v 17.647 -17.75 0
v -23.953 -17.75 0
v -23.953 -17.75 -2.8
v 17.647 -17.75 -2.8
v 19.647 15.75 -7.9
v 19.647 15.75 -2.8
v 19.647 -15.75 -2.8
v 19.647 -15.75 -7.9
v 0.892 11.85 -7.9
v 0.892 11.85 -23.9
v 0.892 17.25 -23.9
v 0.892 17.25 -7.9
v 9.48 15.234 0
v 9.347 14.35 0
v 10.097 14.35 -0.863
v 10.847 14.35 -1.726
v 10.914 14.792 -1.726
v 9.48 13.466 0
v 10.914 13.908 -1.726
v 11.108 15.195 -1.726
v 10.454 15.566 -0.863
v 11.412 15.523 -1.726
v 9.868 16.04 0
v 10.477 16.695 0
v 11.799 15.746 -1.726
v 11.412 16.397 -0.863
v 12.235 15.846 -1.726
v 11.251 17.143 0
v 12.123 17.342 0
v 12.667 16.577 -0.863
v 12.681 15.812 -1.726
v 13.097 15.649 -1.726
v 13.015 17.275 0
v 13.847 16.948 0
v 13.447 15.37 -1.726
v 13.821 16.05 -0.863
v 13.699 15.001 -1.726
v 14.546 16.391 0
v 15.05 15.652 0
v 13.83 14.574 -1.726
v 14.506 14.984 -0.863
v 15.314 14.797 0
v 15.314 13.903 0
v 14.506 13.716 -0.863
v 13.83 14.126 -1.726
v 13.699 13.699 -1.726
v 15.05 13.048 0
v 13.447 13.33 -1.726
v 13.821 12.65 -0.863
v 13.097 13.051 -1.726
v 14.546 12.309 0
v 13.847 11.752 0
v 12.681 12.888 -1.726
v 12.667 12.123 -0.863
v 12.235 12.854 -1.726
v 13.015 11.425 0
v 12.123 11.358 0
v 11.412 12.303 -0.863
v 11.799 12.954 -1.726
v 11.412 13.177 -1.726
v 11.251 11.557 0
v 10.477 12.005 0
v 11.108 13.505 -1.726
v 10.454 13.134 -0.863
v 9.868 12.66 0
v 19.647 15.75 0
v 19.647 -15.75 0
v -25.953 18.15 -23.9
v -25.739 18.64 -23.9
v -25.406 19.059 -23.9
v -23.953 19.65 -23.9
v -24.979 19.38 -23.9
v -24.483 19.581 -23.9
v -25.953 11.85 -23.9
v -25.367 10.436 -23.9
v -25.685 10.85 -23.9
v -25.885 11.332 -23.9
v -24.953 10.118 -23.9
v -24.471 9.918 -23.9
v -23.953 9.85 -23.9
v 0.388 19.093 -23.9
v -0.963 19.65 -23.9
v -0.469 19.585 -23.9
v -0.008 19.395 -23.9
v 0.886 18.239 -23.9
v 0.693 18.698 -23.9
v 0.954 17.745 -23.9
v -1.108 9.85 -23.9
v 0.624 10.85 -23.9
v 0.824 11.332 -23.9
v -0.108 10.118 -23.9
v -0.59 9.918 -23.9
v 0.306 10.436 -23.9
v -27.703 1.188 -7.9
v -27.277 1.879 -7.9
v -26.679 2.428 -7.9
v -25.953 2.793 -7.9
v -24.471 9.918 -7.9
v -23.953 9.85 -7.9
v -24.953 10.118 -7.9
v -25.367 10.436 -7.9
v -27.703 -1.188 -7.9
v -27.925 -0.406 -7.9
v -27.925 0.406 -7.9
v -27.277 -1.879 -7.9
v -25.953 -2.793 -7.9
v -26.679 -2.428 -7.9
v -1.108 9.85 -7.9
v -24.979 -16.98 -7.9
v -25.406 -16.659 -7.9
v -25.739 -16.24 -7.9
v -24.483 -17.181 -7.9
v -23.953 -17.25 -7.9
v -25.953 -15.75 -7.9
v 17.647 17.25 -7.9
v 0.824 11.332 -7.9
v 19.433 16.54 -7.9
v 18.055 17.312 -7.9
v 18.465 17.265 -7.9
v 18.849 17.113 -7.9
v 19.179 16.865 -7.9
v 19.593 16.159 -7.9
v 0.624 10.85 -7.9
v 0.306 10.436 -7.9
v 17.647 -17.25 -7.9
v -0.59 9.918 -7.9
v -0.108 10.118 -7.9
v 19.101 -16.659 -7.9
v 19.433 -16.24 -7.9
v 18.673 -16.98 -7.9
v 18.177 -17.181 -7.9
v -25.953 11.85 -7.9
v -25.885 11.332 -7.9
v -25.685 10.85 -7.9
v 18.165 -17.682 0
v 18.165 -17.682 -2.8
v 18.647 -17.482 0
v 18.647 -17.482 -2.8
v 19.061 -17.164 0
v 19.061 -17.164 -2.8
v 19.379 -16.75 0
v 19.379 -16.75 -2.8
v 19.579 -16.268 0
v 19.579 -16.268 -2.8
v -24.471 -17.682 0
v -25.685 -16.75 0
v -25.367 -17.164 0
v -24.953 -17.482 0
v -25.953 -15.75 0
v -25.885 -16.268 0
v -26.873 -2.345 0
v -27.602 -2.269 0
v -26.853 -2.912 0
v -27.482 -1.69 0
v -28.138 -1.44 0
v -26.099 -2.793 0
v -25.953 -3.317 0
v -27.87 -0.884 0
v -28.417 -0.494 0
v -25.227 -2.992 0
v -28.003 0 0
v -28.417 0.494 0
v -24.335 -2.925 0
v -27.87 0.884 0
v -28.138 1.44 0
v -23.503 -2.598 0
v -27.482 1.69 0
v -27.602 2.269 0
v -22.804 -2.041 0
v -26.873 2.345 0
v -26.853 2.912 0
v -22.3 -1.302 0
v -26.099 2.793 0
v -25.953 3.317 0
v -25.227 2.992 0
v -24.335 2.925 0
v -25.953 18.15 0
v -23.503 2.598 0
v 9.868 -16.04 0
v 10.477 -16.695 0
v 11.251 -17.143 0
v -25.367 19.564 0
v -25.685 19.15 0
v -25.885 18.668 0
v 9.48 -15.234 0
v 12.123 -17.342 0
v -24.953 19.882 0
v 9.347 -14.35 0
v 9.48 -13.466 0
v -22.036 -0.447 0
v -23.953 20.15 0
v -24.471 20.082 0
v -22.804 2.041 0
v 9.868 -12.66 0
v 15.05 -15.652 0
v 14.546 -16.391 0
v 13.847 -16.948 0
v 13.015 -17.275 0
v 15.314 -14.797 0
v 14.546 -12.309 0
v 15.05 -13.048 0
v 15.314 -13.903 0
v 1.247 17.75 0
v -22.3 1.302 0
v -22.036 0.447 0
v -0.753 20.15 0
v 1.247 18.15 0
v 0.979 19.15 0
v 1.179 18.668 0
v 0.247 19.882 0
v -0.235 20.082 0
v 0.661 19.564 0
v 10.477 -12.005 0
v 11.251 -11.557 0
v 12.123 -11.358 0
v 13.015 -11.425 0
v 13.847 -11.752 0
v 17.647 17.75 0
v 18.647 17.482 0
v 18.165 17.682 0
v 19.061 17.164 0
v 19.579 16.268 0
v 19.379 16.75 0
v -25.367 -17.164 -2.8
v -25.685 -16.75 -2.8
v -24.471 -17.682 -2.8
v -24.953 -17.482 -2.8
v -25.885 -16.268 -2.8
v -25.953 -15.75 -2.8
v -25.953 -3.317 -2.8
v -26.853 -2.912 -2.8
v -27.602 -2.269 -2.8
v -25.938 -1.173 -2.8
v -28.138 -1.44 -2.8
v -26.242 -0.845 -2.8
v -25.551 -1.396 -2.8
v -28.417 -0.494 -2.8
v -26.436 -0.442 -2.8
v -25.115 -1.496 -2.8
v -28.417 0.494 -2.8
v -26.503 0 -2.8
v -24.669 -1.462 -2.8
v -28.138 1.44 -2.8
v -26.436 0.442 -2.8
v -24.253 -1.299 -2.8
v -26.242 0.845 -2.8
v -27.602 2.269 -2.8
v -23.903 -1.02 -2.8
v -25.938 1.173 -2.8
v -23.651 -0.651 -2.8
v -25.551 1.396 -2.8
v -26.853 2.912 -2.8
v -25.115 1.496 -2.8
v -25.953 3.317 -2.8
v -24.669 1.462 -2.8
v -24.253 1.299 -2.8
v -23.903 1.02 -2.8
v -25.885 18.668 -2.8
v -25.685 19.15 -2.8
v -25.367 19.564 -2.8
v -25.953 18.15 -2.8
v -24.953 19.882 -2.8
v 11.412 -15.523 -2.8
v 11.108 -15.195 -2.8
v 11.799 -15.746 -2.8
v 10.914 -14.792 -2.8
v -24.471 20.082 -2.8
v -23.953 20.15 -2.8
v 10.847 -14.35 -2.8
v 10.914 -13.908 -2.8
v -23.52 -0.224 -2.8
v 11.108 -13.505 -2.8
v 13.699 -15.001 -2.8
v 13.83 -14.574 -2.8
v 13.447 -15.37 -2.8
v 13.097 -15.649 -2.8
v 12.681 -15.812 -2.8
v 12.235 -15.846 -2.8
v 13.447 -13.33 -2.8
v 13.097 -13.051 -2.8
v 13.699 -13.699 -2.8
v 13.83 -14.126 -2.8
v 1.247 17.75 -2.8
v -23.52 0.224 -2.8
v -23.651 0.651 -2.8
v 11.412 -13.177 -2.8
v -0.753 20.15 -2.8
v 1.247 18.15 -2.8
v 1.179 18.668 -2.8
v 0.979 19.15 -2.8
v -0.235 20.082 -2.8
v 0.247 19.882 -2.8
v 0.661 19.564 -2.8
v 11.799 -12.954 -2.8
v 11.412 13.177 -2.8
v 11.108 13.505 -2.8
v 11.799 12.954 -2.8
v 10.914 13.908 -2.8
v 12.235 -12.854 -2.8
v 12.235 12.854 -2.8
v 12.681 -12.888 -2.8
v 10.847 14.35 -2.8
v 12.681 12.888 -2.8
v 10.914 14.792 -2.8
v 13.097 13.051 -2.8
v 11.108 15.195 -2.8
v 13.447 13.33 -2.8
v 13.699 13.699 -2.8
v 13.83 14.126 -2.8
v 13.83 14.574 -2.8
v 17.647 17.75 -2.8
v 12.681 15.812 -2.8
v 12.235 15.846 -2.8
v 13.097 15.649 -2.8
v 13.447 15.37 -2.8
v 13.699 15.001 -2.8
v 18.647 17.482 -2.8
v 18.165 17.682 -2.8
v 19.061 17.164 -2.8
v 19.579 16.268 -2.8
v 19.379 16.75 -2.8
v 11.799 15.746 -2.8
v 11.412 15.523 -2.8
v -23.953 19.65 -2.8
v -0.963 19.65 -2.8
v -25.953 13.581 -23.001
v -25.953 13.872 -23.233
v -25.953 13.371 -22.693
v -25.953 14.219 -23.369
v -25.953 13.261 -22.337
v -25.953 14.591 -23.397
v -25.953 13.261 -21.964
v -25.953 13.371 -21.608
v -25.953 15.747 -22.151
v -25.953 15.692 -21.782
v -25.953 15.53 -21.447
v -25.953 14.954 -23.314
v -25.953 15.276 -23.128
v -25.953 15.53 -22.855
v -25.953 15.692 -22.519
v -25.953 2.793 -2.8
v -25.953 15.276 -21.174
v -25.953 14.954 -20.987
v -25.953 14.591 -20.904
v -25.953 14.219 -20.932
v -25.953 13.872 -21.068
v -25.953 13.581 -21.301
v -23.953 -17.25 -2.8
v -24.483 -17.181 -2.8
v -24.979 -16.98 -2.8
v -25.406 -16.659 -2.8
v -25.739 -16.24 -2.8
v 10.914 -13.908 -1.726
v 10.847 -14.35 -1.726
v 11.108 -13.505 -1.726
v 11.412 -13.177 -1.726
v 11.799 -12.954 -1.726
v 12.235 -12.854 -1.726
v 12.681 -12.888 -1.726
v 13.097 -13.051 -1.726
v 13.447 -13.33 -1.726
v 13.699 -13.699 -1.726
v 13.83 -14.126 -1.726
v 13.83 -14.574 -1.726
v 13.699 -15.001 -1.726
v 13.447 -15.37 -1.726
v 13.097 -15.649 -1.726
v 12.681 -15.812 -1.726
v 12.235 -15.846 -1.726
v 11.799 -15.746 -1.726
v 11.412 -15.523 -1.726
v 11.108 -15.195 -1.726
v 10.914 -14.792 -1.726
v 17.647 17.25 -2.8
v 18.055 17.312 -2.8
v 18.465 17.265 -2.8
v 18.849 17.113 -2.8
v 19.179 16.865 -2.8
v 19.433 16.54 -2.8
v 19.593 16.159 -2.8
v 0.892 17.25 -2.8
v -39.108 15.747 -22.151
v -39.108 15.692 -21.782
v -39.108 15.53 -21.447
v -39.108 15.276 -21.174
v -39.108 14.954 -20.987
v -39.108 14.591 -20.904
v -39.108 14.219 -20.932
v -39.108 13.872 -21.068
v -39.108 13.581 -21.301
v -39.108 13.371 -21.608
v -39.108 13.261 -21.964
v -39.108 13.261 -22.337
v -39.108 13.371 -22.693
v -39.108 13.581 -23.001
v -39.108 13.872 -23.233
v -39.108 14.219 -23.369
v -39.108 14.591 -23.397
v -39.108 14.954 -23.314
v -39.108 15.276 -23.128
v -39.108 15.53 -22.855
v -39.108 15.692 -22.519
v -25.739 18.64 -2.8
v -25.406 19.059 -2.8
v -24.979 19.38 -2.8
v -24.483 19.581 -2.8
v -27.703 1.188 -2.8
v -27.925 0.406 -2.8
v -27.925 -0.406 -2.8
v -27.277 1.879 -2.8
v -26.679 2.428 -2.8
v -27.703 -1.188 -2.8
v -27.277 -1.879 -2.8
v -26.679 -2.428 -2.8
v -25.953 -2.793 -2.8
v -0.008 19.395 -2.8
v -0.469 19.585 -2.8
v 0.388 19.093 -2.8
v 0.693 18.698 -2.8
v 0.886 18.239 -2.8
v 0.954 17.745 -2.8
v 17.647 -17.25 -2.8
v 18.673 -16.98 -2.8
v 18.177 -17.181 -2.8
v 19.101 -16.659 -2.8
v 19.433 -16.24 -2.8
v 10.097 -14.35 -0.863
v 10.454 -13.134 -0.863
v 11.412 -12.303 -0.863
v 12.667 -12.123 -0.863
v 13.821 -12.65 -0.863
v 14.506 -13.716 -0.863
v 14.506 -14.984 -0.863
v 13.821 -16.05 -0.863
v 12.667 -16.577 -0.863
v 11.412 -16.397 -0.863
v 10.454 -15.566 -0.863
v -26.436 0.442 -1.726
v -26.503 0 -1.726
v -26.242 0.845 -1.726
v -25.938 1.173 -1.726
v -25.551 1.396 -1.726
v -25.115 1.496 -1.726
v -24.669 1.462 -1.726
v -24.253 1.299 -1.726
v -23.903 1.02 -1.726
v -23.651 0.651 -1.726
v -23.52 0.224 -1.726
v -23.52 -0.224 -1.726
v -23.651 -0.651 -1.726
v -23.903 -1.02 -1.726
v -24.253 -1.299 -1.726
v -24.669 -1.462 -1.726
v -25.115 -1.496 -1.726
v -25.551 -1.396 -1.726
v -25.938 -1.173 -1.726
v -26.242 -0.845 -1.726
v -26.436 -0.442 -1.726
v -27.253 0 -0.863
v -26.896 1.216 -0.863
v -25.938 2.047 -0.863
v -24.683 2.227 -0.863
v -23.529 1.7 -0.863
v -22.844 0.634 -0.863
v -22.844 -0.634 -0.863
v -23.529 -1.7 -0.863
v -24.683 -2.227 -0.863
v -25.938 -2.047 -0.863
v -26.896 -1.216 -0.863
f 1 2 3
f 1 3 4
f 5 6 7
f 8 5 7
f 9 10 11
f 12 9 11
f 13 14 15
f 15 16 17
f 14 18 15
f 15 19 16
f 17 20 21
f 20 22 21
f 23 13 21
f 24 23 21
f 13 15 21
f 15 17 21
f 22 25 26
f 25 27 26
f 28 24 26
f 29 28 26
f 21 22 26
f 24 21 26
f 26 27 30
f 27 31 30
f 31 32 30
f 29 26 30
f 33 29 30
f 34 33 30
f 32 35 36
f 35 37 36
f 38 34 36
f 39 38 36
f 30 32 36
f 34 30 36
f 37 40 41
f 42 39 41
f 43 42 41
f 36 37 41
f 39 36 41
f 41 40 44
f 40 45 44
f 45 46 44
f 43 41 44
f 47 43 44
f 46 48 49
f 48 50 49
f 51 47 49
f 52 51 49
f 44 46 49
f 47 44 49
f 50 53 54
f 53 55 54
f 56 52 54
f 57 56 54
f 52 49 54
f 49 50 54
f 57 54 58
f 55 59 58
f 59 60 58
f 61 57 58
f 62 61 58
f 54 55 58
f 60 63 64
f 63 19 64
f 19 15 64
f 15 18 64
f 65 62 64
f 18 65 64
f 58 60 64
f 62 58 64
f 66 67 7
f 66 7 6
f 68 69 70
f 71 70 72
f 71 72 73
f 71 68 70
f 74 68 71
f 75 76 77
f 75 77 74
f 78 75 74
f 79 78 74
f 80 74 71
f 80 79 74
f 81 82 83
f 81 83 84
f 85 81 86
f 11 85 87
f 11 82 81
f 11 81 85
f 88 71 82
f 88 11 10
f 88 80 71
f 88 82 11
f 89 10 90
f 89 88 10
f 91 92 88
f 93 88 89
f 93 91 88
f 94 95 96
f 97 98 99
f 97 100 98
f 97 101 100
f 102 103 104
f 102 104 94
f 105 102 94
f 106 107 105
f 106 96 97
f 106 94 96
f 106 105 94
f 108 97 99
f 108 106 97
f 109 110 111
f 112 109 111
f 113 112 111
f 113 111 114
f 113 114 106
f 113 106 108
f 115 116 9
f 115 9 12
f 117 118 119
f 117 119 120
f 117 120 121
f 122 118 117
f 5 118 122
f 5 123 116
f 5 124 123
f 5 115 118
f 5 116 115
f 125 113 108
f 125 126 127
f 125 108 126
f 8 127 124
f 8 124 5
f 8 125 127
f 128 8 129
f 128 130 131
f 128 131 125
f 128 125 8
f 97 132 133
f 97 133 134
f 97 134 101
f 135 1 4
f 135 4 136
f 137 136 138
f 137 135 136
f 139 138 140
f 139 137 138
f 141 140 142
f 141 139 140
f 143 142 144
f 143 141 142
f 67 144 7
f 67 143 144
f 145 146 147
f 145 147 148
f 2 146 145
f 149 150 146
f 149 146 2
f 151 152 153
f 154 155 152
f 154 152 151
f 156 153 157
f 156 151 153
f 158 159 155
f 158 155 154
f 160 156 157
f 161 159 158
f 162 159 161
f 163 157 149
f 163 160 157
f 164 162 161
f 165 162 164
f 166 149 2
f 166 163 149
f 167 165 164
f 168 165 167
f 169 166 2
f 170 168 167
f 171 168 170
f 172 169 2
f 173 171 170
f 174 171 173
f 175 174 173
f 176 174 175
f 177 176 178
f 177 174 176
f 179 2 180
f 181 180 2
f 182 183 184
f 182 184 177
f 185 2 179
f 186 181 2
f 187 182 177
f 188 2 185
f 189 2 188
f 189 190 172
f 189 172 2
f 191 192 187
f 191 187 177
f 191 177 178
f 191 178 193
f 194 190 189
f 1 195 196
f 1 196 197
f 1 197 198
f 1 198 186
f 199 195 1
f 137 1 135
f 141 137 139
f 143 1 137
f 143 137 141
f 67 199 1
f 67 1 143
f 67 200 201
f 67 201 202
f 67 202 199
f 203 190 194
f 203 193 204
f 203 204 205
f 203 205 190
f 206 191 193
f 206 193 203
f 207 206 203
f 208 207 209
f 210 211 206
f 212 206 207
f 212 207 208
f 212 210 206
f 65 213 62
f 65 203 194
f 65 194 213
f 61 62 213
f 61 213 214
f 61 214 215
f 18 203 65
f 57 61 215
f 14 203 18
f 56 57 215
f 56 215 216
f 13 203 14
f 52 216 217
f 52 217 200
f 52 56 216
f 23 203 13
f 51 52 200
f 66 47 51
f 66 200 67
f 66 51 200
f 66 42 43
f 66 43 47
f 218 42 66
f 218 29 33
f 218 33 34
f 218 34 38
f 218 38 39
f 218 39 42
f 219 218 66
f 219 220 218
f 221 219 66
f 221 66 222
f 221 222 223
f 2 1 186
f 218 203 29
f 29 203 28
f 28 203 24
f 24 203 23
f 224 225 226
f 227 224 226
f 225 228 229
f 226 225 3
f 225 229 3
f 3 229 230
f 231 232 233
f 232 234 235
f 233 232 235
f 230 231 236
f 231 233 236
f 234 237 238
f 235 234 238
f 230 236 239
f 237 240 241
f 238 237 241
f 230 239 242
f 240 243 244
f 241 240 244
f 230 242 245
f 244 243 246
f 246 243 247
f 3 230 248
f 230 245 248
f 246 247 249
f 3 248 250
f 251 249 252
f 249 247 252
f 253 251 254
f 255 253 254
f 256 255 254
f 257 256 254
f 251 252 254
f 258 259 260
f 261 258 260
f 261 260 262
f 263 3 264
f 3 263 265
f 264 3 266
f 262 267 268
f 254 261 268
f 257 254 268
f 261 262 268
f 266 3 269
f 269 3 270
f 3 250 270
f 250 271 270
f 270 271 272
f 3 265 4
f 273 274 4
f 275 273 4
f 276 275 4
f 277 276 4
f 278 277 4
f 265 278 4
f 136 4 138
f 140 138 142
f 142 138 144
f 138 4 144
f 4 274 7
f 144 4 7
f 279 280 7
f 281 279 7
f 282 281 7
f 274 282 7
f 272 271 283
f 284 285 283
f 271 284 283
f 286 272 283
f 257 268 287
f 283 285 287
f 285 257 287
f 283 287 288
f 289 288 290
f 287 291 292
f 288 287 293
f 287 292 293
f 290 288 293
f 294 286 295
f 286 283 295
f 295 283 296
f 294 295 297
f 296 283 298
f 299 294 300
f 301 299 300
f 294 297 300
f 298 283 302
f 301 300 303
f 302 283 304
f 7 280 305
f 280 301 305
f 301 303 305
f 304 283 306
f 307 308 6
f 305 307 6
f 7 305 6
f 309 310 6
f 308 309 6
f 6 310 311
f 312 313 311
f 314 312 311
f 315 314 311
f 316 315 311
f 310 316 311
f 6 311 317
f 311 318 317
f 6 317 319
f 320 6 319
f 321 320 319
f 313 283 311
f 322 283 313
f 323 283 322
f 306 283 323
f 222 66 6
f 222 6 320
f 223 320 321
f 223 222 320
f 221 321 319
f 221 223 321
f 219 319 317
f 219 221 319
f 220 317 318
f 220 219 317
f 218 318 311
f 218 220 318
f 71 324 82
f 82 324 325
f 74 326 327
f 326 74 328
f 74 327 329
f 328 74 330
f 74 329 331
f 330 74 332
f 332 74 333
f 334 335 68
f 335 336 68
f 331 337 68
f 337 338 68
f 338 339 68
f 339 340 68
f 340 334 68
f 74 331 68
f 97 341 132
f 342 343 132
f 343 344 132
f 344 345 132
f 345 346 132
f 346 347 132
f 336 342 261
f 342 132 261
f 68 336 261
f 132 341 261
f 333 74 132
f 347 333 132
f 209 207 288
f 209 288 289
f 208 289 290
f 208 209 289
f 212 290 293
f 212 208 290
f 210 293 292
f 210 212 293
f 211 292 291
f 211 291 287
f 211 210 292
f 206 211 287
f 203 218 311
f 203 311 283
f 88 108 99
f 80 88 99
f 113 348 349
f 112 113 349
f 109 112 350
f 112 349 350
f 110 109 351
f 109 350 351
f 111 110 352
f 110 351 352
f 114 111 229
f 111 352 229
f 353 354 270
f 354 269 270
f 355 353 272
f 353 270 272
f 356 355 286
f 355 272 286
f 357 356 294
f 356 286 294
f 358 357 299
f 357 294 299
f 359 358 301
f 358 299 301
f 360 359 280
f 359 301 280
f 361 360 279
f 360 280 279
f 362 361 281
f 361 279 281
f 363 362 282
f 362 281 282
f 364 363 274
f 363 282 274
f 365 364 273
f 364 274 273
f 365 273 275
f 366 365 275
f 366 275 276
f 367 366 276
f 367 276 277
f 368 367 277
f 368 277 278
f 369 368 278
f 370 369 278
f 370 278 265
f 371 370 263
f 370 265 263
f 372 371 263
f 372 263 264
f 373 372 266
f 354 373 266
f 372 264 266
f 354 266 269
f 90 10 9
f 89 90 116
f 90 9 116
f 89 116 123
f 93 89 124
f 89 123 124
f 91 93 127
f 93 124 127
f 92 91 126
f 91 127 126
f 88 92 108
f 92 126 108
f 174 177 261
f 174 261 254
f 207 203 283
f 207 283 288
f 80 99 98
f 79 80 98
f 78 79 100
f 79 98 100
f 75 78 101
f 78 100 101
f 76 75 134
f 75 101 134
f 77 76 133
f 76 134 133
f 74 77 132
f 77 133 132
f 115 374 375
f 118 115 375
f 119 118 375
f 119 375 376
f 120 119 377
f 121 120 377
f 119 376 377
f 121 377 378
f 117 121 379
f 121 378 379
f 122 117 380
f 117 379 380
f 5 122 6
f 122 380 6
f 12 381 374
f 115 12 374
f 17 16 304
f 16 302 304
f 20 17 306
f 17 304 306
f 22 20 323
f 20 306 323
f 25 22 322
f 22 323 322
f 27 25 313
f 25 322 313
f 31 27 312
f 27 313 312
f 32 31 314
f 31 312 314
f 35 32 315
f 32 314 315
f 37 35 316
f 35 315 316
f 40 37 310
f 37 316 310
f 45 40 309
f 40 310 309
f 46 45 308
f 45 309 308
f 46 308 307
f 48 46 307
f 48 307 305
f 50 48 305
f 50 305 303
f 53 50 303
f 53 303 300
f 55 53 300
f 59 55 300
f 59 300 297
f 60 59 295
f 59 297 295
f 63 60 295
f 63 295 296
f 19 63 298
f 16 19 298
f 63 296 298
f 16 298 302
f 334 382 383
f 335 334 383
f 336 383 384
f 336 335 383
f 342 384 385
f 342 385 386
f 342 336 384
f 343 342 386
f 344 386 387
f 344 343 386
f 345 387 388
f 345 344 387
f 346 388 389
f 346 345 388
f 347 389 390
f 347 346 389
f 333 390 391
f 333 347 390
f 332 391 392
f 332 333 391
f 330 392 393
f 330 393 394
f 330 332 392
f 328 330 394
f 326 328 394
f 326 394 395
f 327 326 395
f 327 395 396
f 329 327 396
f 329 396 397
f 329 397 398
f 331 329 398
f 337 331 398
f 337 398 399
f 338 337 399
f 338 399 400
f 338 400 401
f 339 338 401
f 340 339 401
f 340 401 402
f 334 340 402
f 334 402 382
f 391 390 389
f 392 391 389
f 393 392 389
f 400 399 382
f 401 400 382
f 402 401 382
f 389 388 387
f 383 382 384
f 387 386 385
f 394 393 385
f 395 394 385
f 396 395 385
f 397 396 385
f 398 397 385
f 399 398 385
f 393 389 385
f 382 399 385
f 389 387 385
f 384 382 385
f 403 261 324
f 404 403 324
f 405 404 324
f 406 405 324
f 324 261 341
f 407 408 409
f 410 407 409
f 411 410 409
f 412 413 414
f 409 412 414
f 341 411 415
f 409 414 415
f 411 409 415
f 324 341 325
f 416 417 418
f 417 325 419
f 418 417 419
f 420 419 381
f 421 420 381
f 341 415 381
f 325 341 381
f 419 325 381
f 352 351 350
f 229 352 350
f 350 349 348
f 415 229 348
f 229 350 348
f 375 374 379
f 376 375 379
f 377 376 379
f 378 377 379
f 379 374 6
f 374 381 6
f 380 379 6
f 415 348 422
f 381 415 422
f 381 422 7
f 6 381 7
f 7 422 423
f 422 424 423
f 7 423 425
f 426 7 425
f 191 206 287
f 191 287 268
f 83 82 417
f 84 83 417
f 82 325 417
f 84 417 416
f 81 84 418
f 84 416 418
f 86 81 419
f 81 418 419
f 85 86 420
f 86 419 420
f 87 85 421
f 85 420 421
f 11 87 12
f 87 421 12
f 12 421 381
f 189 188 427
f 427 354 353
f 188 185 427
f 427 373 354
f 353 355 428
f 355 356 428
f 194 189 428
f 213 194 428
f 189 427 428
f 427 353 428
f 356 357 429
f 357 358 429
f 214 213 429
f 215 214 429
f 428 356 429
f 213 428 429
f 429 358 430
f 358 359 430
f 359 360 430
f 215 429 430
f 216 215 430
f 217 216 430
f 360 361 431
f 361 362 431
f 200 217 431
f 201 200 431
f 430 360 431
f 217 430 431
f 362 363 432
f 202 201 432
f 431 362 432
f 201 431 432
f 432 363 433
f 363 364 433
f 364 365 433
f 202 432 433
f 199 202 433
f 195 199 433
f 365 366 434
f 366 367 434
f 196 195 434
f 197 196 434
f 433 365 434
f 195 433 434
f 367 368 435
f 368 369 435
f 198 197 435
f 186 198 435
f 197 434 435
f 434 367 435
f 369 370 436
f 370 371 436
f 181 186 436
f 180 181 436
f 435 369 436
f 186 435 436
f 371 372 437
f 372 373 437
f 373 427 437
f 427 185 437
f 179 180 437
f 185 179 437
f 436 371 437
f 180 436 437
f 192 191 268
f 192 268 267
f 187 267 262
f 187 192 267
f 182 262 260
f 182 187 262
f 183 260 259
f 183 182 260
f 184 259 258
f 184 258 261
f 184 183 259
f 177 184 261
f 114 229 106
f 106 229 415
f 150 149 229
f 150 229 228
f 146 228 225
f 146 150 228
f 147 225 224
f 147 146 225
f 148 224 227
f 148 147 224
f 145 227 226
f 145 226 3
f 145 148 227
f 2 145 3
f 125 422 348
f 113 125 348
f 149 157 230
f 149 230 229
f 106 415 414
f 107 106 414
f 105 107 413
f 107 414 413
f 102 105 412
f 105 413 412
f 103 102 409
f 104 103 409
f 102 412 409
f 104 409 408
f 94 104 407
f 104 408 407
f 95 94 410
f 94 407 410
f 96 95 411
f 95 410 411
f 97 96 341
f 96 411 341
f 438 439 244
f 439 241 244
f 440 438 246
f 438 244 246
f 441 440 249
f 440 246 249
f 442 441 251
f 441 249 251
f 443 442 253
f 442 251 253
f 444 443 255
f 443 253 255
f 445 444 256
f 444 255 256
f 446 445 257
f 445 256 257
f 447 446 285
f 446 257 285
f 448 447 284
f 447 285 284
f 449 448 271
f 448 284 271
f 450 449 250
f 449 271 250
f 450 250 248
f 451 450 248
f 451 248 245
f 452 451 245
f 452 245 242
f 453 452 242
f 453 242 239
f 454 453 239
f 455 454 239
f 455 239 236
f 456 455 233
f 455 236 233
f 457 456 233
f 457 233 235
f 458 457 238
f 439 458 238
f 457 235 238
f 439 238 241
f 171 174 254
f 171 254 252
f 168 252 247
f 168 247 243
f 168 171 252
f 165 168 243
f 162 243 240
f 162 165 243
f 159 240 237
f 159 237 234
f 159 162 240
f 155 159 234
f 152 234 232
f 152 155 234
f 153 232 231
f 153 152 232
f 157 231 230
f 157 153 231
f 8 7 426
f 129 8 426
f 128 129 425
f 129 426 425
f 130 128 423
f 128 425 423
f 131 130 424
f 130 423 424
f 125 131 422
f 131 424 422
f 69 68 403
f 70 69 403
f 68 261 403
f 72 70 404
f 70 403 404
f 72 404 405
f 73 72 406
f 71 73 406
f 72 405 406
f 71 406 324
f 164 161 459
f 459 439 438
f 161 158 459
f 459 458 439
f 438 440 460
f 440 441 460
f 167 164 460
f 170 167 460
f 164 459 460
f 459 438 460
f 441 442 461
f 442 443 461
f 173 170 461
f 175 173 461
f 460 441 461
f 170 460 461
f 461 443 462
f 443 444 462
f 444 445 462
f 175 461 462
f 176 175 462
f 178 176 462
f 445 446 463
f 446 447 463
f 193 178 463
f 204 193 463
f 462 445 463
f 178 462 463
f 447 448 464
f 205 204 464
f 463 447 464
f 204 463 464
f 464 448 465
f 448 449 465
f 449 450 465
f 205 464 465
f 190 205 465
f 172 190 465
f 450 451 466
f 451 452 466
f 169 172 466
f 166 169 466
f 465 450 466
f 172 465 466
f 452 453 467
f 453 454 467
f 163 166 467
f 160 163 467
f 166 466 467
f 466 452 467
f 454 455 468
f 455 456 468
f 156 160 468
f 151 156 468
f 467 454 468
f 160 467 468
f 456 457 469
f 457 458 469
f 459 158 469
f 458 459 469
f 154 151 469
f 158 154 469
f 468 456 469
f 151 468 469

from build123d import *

# Parameters (mm, degrees)
F1_DEPTH       = 2.8
F2_D           = 3
F2_CSINK_D     = 6
F2_CSINK_ANGLE = 82
F4_DEPTH       = 5.1
F6_DEPTH       = 16
F7_R           = 1.25
F8_DEPTH       = 40


with BuildPart() as f1:
    # F0 (on Top) → F1 (new body)
    with BuildSketch(Plane.XY):
        with BuildLine():
            Line((-0.7529023737, 20.15), (-23.9529023737, 20.15))
            ThreePointArc((-23.9529023737, 20.15), (-25.367115936, 19.5642135624), (-25.9529023737, 18.15))
            Line((-25.9529023737, 18.15), (-25.9529023737, 3.3166247904))
            ThreePointArc((-25.9529023737, 3.3166247904), (-28.4529023737, 0), (-25.9529023737, -3.3166247904))
            Line((-25.9529023737, -3.3166247904), (-25.9529023737, -15.75))
            ThreePointArc((-25.9529023737, -15.75), (-25.367115936, -17.1642135624), (-23.9529023737, -17.75))
            Line((-23.9529023737, -17.75), (17.6470976263, -17.75))
            ThreePointArc((17.6470976263, -17.75), (19.0613111887, -17.1642135624), (19.6470976263, -15.75))
            Line((19.6470976263, -15.75), (19.6470976263, 15.75))
            ThreePointArc((19.6470976263, 15.75), (19.0613111887, 17.1642135624), (17.6470976263, 17.75))
            Line((17.6470976263, 17.75), (1.2470976263, 17.75))
            Line((1.2470976263, 17.75), (1.2470976263, 18.15))
            ThreePointArc((1.2470976263, 18.15), (0.6613111887, 19.5642135624), (-0.7529023737, 20.15))
        make_face()
    extrude(amount=-F1_DEPTH)

    # F2 (through all)
    with Locations(Plane.XY):
        with Locations((-25.0029023737, 0), (12.3470976263, 14.35), (12.3470976263, -14.35)):
            CounterSinkHole(F2_D / 2, F2_CSINK_D / 2, counter_sink_angle=F2_CSINK_ANGLE)


with BuildPart() as f4:
    # F3 (on face) → F4 (new body)
    with BuildSketch(Plane(origin=(0, 0, -2.8), x_dir=(1, 0, 0), z_dir=(0, 0, -1))):
        with BuildLine():
            Line((17.6470976263, 17.25), (-23.9529023737, 17.25))
            ThreePointArc((-23.9529023737, 17.25), (-25.2029023737, 16.8333333333), (-25.9529023737, 15.75))
            Line((-25.9529023737, 15.75), (-25.9529023737, 3.3166247904))
            Line((-25.9529023737, 3.3166247904), (-25.9529023737, 2.7928480088))
            ThreePointArc((-25.9529023737, 2.7928480088), (-27.9529023737, 0), (-25.9529023737, -2.7928480088))
            Line((-25.9529023737, -2.7928480088), (-25.9529023737, -3.3166247904))
            Line((-25.9529023737, -3.3166247904), (-25.9529023737, -18.15))
            ThreePointArc((-25.9529023737, -18.15), (-25.2029023737, -19.2333333333), (-23.9529023737, -19.65))
            Line((-23.9529023737, -19.65), (-0.96321007, -19.65))
            ThreePointArc((-0.96321007, -19.65), (0.5535734331, -18.9054098922), (0.8921952177, -17.25))
            Line((0.8921952177, -17.25), (17.6470976263, -17.25))
            ThreePointArc((17.6470976263, -17.25), (19.0220976263, -17), (19.6470976263, -15.75))
            Line((19.6470976263, -15.75), (19.6470976263, 15.75))
            ThreePointArc((19.6470976263, 15.75), (18.8970976263, 16.8333333333), (17.6470976263, 17.25))
        make_face()
    extrude(amount=F4_DEPTH)

    # F5 (on face) → F6 (join)
    with BuildSketch(Plane(origin=(0, 0, -7.9), x_dir=(1, 0, 0), z_dir=(0, 0, -1))):
        with BuildLine():
            Line((-25.9529023737, -11.85), (-25.9529023737, -18.15))
            ThreePointArc((-25.9529023737, -18.15), (-25.2029023737, -19.2333333333), (-23.9529023737, -19.65))
            Line((-23.9529023737, -19.65), (-0.96321007, -19.65))
            ThreePointArc((-0.96321007, -19.65), (0.5535734331, -18.9054098922), (0.8921952177, -17.25))
            Line((0.8921952177, -17.25), (0.8921952177, -11.85))
            ThreePointArc((0.8921952177, -11.85), (0.3064087801, -10.4357864376), (-1.1078047823, -9.85))
            Line((-1.1078047823, -9.85), (-23.9529023737, -9.85))
            ThreePointArc((-23.9529023737, -9.85), (-25.367115936, -10.4357864376), (-25.9529023737, -11.85))
        make_face()
    extrude(amount=F6_DEPTH)

    # F7 (on face) → F8 (join)
    with BuildSketch(Plane.YZ.offset(0.8921952177)):
        with Locations((14.4971305676, -22.1507988043)):
            Circle(F7_R)
    extrude(amount=-F8_DEPTH)


solid = Compound([f1.part, f4.part])
